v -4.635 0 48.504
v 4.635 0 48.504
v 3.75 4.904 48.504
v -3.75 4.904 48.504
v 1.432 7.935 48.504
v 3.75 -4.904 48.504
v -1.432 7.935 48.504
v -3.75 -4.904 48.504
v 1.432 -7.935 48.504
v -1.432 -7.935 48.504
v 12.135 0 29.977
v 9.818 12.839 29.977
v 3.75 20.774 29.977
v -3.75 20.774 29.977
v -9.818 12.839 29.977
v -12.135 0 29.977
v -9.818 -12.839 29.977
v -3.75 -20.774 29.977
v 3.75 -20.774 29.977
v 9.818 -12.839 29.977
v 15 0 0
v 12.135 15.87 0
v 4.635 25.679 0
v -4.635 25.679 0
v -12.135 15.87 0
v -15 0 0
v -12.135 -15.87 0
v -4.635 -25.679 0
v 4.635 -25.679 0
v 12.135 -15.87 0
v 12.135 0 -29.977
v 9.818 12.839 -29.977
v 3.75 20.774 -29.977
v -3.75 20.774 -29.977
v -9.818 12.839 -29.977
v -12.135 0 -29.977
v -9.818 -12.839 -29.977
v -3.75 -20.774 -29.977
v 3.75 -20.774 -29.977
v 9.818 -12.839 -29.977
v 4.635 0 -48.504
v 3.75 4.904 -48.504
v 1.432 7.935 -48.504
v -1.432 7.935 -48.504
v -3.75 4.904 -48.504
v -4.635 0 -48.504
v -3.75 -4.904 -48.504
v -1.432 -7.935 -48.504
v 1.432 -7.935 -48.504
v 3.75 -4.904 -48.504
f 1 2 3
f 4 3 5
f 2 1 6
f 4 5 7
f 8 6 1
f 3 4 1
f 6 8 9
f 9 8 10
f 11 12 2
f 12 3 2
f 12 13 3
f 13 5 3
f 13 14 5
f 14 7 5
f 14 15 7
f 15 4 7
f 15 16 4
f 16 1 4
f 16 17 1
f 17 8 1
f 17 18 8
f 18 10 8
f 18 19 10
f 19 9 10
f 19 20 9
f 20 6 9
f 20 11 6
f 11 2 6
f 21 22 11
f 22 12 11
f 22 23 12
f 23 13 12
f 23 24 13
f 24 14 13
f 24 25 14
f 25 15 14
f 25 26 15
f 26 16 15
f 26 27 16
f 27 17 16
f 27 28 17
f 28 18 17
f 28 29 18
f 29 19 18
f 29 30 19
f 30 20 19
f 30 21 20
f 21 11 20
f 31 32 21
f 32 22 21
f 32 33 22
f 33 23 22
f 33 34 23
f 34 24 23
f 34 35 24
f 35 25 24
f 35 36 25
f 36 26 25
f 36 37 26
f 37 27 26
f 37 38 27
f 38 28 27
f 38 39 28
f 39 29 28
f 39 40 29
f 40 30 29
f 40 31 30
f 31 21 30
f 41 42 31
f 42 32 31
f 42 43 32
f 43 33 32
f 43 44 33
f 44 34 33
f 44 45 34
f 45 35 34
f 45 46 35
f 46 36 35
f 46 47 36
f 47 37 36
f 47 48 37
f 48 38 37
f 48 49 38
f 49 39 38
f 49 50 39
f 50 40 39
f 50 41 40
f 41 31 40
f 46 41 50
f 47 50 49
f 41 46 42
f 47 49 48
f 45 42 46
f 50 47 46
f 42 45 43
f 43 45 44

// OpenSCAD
// Generated by SolidPython 1.0.1 on 2020-07-29 00:46:46


scale(v = [5, 9, 17]) {
	sphere(r = 3);
}
/***********************************************
*********      SolidPython code:      **********
************************************************
 
# import packages: SolidPython
from solid import *
from solid.utils import *
from itertools import chain, combinations, permutations


class Resize:

    def __init__(self, scad_file):
        self.scad_file = scad_file
        #self.scad_file = import_scad(scad_file)
        # cone/cylinder param:
        self.r1 = 0
        self.r2 = 0
        self.h = 0
        # rectangular prism param:
        self.w = 0
        self.l = 0
        # ellipse param:
        self.r = 0

    # import OpenScad code (file name corresponds to shape)


    # classify shape + parameters
    def assign(self, param1, param2, param3):
        if self.scad_file == 'cone.scad':
            self.r1 = param1
            self.r2 = param2
            self.h = param3
        elif self.scad_file == 'cylinder.scad':
            self.r1 = param1
            self.r2 = param2
            self.h = param3
        elif self.scad_file == 'rectangularPrism.scad':
            self.h = param1
            self.l = param2
            self.w = param3
        else:
            self.r = param1
            self.h = param2

    # resize parameters
    def iterate(self):
        x = range(3, 20, 2)
        i = 1
        if self.scad_file == 'cone.scad':
            tempList = list(permutations(x, 2))
            for temp in tempList:
                param1 = temp[0]
                param2 = temp[1]
                filepath = 'produced_scad_files/' + 'cone' + str(param1) + '_' + str(param2) + '_' + '.scad'
                scad_render_to_file(cylinder(h=param1, r1=param2, r2=0), filepath)

        elif self.scad_file == 'cylinder.scad':
            tempList = list(permutations(x, 3))
            for temp in tempList:
                param1 = temp[0]
                param2 = temp[1]
                filepath = 'produced_scad_files/' + 'cylinder' + str(param1) + '_' + str(param2) + '_' + '.scad'
                scad_render_to_file(cylinder(h=param1, r1=param2, r2=param2), filepath)

        elif self.scad_file == 'rectangularPrism.scad':
            tempList = list(permutations(x, 3))
            for temp in tempList:
                param1 = temp[0]
                param2 = temp[1]
                param3 = temp[2]
                filepath = 'produced_scad_files/' + 'rectangularPrism' + str(param1) + '_' + str(param2) + '_' + str(
                    param3) + '.scad'
                scad_render_to_file(cube(size=(param1, param2, param3)), filepath)

        elif self.scad_file == 'ellipse.scad':
            tempList = list(permutations(x, 4))
            for temp in tempList:
                param1 = temp[0]
                param2 = temp[1]
                param3 = temp[2]
                param4 = temp[3]
                filepath = 'produced_scad_files/' + 'ellipse' + str(param1) + '_' + str(param2) + '_' + str(param3) + '_' + str(param4) + '.scad'
                scad_render_to_file(scale([param1, param2, param3])(sphere(r=param4)), filepath)

    def render_to_scadfile(self):
        scad_render_to_file(scad, 'example.scad') 
 
************************************************/
